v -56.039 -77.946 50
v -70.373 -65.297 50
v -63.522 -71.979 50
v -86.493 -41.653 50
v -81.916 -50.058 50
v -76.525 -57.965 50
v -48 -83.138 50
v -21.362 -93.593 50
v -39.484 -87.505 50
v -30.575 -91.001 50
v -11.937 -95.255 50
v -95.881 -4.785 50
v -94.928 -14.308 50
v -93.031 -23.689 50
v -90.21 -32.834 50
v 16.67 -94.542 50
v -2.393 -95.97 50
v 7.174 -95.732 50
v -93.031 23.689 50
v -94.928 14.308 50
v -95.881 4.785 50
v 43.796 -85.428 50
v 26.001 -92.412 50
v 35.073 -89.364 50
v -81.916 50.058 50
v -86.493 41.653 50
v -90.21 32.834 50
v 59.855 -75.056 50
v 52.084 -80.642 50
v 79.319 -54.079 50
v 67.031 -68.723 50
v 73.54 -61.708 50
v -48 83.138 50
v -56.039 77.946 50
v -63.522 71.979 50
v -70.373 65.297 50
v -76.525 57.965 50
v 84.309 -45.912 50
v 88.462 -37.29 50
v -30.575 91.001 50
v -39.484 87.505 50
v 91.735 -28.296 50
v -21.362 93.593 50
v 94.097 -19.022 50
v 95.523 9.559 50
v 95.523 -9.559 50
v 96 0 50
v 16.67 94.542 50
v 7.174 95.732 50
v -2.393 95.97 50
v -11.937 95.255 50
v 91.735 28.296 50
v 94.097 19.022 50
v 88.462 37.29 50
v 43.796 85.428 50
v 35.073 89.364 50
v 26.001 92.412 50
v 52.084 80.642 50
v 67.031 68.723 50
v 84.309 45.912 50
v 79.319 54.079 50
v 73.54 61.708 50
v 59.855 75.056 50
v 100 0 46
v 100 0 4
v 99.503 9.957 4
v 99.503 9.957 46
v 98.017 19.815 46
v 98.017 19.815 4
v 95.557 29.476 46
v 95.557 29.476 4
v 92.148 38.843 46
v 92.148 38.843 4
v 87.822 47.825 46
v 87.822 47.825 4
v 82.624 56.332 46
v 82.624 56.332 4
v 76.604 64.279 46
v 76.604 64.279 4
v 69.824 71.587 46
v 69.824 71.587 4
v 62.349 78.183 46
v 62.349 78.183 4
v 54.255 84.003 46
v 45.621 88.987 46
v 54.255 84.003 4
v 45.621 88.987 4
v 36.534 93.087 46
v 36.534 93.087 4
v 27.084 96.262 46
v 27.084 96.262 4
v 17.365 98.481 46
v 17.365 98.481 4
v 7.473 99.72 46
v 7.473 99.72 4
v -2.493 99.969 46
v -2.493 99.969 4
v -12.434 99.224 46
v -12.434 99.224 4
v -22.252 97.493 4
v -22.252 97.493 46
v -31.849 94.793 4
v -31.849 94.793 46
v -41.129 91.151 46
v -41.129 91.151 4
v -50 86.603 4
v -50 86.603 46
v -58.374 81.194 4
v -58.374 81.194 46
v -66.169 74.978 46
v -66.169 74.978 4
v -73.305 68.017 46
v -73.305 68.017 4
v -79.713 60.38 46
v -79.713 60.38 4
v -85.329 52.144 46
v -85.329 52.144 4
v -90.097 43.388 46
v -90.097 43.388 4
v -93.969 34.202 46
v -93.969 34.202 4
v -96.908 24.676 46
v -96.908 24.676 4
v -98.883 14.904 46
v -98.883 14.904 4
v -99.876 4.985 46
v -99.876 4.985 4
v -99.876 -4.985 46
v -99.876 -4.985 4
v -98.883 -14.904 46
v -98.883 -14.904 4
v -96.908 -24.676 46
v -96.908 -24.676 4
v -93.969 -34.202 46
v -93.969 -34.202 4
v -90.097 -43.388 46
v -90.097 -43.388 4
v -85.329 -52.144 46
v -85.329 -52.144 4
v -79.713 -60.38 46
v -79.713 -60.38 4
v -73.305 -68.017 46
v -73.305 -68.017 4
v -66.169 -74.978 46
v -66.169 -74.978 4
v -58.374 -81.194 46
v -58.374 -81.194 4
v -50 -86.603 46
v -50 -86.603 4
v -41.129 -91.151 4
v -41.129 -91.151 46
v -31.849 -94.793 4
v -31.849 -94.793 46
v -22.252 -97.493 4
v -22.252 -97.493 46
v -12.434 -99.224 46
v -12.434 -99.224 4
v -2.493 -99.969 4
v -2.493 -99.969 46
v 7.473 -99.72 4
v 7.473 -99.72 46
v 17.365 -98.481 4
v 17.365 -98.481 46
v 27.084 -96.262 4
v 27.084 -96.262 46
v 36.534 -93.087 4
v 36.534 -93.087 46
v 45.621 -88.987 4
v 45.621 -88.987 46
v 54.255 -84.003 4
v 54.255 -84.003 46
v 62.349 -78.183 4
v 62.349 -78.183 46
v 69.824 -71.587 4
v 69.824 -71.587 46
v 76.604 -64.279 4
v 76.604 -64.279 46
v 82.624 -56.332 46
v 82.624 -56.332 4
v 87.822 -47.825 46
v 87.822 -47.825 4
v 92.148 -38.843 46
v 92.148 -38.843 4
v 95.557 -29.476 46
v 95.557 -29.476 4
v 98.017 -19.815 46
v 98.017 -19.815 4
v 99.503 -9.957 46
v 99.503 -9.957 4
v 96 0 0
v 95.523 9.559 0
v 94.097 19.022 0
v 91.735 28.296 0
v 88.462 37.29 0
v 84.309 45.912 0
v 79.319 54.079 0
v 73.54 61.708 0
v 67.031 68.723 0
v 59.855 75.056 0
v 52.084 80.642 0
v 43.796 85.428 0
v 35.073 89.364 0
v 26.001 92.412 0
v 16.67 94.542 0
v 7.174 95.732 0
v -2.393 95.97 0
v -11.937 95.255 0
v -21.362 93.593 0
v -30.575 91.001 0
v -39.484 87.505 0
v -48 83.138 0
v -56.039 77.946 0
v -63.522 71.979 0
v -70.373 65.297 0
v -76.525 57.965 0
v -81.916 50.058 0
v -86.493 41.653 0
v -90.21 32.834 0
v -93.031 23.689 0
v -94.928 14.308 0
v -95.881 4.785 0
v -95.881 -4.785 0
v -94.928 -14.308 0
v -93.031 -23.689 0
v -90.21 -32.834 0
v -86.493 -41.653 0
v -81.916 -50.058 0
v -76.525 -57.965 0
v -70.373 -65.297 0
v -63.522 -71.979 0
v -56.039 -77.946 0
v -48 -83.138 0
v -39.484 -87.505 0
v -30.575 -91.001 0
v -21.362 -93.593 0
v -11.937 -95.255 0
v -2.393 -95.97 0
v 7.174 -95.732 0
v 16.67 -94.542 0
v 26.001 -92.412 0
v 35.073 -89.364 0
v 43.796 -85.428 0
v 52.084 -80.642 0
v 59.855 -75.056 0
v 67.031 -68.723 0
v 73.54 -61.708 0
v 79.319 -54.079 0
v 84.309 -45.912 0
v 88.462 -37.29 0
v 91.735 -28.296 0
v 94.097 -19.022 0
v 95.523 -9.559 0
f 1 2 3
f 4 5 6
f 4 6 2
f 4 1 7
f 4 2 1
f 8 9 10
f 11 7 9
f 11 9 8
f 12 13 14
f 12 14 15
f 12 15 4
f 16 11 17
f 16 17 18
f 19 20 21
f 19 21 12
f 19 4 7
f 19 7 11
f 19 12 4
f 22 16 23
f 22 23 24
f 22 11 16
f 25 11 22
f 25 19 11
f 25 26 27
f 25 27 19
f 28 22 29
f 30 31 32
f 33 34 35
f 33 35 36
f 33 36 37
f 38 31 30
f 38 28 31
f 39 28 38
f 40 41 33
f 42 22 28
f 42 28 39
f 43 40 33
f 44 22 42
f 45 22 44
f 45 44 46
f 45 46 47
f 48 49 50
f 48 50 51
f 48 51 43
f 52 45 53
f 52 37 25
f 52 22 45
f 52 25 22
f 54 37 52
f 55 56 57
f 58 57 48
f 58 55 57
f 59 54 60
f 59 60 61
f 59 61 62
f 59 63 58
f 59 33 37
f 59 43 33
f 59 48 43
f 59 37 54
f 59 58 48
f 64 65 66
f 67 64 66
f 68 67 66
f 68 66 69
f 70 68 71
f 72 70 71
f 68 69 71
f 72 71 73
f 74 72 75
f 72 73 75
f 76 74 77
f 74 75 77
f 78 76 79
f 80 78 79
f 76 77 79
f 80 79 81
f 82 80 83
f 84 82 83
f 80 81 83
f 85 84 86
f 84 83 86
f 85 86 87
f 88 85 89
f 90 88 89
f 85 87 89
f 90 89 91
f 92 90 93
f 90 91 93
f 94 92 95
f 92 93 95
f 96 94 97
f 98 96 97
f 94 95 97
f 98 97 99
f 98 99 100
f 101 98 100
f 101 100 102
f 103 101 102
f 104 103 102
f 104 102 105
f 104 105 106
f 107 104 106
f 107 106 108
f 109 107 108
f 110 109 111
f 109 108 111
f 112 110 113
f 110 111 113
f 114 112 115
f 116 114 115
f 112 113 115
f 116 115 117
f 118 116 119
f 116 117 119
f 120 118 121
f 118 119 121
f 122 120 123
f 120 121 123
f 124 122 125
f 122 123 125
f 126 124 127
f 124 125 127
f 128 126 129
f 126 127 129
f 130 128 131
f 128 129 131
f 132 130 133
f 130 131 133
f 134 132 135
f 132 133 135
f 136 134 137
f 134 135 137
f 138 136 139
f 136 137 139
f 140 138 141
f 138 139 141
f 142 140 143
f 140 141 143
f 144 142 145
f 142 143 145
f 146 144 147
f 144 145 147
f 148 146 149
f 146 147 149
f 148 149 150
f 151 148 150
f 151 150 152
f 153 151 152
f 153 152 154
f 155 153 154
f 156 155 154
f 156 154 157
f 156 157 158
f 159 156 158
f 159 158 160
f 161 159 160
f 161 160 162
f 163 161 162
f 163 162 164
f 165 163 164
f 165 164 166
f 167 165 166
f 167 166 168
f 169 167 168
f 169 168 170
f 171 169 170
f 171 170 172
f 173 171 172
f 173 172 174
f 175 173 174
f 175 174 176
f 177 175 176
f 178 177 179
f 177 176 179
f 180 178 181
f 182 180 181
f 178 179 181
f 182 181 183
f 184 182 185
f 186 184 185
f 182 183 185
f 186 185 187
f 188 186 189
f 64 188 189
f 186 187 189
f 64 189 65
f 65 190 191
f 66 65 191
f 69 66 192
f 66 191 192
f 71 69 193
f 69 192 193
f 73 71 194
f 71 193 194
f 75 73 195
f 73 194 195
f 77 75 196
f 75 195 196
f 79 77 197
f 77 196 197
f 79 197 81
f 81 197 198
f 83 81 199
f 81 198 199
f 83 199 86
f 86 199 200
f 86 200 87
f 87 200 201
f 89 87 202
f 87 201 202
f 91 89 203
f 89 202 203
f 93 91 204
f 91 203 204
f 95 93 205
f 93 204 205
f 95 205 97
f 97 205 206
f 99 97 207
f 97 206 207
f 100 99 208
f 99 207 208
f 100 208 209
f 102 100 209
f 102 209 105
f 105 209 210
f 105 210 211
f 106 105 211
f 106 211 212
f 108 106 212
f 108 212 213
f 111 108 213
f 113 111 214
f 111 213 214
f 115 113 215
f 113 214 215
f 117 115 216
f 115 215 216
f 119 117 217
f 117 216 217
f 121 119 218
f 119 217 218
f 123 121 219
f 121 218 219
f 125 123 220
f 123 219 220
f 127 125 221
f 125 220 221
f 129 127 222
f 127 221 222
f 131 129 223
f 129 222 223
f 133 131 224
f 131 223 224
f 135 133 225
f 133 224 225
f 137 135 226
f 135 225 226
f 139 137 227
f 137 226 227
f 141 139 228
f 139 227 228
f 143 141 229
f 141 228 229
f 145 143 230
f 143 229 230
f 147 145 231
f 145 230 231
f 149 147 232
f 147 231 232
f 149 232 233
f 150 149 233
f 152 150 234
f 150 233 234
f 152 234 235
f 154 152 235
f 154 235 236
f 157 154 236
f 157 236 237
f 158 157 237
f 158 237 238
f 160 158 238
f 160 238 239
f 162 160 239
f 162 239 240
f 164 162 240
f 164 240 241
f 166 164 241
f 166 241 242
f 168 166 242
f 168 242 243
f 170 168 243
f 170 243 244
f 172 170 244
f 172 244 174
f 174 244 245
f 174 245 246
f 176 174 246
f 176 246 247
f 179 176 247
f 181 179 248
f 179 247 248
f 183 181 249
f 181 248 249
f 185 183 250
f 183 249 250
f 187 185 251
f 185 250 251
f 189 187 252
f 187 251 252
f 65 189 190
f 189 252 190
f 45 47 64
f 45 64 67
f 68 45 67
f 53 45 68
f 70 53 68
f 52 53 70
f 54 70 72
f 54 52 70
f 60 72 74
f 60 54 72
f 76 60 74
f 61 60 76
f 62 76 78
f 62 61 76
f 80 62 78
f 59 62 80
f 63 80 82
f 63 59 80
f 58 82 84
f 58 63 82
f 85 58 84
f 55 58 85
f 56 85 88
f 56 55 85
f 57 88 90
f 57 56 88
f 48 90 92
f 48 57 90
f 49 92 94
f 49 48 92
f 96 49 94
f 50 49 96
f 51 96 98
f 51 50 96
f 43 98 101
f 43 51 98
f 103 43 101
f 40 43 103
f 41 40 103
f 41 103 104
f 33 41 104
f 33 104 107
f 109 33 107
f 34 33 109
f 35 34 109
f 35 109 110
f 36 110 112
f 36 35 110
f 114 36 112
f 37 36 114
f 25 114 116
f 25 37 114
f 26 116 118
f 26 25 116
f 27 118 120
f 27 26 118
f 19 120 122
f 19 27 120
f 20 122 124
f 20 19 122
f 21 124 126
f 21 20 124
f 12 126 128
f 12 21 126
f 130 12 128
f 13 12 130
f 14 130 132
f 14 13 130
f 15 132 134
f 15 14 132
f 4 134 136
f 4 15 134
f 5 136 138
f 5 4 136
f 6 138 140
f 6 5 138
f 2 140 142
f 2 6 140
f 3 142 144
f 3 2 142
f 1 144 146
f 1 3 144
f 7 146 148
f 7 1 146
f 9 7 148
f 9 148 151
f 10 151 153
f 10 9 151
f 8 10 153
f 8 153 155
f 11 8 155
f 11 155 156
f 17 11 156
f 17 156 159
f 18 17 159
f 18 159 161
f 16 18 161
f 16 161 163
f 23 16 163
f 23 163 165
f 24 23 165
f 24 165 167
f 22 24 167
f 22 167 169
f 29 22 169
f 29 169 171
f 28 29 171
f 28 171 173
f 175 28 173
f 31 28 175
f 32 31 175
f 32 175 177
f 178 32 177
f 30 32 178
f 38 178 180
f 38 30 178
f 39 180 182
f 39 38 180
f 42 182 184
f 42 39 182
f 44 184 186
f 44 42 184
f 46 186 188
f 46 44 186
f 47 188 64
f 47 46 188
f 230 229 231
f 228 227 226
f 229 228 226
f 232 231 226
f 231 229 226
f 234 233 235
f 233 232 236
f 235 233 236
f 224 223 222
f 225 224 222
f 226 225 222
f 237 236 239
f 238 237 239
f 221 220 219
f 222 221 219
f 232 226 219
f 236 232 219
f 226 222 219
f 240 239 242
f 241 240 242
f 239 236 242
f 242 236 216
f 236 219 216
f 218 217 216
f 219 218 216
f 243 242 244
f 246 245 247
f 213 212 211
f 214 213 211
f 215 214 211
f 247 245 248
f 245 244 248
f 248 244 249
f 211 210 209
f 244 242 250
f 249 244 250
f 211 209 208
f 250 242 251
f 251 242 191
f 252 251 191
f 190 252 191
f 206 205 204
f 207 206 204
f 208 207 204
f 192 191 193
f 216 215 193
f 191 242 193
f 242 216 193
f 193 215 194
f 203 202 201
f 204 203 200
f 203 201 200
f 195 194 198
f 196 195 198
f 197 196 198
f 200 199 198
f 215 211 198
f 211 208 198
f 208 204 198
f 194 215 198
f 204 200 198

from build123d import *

# Parameters (mm, degrees)
ESQUISSE1_R        = 100
BOSS_EXTRU_1_DEPTH = 50
CHANFREIN1_SIZE    = 4
CHANFREIN2_SIZE    = 4


with BuildPart() as part:
    # Esquisse1 → Boss.-Extru.1 (new body)
    with BuildSketch(Plane.XY):
        Circle(ESQUISSE1_R)
    extrude(amount=BOSS_EXTRU_1_DEPTH)

    # Chanfrein1
    chanfrein1_edges = [part.edges().sort_by_distance(p)[0] for p in [
        (-100, 0, 0),
    ]]
    chamfer(chanfrein1_edges, length=CHANFREIN1_SIZE)

    # Chanfrein2
    chanfrein2_edges = [part.edges().sort_by_distance(p)[0] for p in [
        (-100, 0, 50),
    ]]
    chamfer(chanfrein2_edges, length=CHANFREIN2_SIZE)


solid = part.part
